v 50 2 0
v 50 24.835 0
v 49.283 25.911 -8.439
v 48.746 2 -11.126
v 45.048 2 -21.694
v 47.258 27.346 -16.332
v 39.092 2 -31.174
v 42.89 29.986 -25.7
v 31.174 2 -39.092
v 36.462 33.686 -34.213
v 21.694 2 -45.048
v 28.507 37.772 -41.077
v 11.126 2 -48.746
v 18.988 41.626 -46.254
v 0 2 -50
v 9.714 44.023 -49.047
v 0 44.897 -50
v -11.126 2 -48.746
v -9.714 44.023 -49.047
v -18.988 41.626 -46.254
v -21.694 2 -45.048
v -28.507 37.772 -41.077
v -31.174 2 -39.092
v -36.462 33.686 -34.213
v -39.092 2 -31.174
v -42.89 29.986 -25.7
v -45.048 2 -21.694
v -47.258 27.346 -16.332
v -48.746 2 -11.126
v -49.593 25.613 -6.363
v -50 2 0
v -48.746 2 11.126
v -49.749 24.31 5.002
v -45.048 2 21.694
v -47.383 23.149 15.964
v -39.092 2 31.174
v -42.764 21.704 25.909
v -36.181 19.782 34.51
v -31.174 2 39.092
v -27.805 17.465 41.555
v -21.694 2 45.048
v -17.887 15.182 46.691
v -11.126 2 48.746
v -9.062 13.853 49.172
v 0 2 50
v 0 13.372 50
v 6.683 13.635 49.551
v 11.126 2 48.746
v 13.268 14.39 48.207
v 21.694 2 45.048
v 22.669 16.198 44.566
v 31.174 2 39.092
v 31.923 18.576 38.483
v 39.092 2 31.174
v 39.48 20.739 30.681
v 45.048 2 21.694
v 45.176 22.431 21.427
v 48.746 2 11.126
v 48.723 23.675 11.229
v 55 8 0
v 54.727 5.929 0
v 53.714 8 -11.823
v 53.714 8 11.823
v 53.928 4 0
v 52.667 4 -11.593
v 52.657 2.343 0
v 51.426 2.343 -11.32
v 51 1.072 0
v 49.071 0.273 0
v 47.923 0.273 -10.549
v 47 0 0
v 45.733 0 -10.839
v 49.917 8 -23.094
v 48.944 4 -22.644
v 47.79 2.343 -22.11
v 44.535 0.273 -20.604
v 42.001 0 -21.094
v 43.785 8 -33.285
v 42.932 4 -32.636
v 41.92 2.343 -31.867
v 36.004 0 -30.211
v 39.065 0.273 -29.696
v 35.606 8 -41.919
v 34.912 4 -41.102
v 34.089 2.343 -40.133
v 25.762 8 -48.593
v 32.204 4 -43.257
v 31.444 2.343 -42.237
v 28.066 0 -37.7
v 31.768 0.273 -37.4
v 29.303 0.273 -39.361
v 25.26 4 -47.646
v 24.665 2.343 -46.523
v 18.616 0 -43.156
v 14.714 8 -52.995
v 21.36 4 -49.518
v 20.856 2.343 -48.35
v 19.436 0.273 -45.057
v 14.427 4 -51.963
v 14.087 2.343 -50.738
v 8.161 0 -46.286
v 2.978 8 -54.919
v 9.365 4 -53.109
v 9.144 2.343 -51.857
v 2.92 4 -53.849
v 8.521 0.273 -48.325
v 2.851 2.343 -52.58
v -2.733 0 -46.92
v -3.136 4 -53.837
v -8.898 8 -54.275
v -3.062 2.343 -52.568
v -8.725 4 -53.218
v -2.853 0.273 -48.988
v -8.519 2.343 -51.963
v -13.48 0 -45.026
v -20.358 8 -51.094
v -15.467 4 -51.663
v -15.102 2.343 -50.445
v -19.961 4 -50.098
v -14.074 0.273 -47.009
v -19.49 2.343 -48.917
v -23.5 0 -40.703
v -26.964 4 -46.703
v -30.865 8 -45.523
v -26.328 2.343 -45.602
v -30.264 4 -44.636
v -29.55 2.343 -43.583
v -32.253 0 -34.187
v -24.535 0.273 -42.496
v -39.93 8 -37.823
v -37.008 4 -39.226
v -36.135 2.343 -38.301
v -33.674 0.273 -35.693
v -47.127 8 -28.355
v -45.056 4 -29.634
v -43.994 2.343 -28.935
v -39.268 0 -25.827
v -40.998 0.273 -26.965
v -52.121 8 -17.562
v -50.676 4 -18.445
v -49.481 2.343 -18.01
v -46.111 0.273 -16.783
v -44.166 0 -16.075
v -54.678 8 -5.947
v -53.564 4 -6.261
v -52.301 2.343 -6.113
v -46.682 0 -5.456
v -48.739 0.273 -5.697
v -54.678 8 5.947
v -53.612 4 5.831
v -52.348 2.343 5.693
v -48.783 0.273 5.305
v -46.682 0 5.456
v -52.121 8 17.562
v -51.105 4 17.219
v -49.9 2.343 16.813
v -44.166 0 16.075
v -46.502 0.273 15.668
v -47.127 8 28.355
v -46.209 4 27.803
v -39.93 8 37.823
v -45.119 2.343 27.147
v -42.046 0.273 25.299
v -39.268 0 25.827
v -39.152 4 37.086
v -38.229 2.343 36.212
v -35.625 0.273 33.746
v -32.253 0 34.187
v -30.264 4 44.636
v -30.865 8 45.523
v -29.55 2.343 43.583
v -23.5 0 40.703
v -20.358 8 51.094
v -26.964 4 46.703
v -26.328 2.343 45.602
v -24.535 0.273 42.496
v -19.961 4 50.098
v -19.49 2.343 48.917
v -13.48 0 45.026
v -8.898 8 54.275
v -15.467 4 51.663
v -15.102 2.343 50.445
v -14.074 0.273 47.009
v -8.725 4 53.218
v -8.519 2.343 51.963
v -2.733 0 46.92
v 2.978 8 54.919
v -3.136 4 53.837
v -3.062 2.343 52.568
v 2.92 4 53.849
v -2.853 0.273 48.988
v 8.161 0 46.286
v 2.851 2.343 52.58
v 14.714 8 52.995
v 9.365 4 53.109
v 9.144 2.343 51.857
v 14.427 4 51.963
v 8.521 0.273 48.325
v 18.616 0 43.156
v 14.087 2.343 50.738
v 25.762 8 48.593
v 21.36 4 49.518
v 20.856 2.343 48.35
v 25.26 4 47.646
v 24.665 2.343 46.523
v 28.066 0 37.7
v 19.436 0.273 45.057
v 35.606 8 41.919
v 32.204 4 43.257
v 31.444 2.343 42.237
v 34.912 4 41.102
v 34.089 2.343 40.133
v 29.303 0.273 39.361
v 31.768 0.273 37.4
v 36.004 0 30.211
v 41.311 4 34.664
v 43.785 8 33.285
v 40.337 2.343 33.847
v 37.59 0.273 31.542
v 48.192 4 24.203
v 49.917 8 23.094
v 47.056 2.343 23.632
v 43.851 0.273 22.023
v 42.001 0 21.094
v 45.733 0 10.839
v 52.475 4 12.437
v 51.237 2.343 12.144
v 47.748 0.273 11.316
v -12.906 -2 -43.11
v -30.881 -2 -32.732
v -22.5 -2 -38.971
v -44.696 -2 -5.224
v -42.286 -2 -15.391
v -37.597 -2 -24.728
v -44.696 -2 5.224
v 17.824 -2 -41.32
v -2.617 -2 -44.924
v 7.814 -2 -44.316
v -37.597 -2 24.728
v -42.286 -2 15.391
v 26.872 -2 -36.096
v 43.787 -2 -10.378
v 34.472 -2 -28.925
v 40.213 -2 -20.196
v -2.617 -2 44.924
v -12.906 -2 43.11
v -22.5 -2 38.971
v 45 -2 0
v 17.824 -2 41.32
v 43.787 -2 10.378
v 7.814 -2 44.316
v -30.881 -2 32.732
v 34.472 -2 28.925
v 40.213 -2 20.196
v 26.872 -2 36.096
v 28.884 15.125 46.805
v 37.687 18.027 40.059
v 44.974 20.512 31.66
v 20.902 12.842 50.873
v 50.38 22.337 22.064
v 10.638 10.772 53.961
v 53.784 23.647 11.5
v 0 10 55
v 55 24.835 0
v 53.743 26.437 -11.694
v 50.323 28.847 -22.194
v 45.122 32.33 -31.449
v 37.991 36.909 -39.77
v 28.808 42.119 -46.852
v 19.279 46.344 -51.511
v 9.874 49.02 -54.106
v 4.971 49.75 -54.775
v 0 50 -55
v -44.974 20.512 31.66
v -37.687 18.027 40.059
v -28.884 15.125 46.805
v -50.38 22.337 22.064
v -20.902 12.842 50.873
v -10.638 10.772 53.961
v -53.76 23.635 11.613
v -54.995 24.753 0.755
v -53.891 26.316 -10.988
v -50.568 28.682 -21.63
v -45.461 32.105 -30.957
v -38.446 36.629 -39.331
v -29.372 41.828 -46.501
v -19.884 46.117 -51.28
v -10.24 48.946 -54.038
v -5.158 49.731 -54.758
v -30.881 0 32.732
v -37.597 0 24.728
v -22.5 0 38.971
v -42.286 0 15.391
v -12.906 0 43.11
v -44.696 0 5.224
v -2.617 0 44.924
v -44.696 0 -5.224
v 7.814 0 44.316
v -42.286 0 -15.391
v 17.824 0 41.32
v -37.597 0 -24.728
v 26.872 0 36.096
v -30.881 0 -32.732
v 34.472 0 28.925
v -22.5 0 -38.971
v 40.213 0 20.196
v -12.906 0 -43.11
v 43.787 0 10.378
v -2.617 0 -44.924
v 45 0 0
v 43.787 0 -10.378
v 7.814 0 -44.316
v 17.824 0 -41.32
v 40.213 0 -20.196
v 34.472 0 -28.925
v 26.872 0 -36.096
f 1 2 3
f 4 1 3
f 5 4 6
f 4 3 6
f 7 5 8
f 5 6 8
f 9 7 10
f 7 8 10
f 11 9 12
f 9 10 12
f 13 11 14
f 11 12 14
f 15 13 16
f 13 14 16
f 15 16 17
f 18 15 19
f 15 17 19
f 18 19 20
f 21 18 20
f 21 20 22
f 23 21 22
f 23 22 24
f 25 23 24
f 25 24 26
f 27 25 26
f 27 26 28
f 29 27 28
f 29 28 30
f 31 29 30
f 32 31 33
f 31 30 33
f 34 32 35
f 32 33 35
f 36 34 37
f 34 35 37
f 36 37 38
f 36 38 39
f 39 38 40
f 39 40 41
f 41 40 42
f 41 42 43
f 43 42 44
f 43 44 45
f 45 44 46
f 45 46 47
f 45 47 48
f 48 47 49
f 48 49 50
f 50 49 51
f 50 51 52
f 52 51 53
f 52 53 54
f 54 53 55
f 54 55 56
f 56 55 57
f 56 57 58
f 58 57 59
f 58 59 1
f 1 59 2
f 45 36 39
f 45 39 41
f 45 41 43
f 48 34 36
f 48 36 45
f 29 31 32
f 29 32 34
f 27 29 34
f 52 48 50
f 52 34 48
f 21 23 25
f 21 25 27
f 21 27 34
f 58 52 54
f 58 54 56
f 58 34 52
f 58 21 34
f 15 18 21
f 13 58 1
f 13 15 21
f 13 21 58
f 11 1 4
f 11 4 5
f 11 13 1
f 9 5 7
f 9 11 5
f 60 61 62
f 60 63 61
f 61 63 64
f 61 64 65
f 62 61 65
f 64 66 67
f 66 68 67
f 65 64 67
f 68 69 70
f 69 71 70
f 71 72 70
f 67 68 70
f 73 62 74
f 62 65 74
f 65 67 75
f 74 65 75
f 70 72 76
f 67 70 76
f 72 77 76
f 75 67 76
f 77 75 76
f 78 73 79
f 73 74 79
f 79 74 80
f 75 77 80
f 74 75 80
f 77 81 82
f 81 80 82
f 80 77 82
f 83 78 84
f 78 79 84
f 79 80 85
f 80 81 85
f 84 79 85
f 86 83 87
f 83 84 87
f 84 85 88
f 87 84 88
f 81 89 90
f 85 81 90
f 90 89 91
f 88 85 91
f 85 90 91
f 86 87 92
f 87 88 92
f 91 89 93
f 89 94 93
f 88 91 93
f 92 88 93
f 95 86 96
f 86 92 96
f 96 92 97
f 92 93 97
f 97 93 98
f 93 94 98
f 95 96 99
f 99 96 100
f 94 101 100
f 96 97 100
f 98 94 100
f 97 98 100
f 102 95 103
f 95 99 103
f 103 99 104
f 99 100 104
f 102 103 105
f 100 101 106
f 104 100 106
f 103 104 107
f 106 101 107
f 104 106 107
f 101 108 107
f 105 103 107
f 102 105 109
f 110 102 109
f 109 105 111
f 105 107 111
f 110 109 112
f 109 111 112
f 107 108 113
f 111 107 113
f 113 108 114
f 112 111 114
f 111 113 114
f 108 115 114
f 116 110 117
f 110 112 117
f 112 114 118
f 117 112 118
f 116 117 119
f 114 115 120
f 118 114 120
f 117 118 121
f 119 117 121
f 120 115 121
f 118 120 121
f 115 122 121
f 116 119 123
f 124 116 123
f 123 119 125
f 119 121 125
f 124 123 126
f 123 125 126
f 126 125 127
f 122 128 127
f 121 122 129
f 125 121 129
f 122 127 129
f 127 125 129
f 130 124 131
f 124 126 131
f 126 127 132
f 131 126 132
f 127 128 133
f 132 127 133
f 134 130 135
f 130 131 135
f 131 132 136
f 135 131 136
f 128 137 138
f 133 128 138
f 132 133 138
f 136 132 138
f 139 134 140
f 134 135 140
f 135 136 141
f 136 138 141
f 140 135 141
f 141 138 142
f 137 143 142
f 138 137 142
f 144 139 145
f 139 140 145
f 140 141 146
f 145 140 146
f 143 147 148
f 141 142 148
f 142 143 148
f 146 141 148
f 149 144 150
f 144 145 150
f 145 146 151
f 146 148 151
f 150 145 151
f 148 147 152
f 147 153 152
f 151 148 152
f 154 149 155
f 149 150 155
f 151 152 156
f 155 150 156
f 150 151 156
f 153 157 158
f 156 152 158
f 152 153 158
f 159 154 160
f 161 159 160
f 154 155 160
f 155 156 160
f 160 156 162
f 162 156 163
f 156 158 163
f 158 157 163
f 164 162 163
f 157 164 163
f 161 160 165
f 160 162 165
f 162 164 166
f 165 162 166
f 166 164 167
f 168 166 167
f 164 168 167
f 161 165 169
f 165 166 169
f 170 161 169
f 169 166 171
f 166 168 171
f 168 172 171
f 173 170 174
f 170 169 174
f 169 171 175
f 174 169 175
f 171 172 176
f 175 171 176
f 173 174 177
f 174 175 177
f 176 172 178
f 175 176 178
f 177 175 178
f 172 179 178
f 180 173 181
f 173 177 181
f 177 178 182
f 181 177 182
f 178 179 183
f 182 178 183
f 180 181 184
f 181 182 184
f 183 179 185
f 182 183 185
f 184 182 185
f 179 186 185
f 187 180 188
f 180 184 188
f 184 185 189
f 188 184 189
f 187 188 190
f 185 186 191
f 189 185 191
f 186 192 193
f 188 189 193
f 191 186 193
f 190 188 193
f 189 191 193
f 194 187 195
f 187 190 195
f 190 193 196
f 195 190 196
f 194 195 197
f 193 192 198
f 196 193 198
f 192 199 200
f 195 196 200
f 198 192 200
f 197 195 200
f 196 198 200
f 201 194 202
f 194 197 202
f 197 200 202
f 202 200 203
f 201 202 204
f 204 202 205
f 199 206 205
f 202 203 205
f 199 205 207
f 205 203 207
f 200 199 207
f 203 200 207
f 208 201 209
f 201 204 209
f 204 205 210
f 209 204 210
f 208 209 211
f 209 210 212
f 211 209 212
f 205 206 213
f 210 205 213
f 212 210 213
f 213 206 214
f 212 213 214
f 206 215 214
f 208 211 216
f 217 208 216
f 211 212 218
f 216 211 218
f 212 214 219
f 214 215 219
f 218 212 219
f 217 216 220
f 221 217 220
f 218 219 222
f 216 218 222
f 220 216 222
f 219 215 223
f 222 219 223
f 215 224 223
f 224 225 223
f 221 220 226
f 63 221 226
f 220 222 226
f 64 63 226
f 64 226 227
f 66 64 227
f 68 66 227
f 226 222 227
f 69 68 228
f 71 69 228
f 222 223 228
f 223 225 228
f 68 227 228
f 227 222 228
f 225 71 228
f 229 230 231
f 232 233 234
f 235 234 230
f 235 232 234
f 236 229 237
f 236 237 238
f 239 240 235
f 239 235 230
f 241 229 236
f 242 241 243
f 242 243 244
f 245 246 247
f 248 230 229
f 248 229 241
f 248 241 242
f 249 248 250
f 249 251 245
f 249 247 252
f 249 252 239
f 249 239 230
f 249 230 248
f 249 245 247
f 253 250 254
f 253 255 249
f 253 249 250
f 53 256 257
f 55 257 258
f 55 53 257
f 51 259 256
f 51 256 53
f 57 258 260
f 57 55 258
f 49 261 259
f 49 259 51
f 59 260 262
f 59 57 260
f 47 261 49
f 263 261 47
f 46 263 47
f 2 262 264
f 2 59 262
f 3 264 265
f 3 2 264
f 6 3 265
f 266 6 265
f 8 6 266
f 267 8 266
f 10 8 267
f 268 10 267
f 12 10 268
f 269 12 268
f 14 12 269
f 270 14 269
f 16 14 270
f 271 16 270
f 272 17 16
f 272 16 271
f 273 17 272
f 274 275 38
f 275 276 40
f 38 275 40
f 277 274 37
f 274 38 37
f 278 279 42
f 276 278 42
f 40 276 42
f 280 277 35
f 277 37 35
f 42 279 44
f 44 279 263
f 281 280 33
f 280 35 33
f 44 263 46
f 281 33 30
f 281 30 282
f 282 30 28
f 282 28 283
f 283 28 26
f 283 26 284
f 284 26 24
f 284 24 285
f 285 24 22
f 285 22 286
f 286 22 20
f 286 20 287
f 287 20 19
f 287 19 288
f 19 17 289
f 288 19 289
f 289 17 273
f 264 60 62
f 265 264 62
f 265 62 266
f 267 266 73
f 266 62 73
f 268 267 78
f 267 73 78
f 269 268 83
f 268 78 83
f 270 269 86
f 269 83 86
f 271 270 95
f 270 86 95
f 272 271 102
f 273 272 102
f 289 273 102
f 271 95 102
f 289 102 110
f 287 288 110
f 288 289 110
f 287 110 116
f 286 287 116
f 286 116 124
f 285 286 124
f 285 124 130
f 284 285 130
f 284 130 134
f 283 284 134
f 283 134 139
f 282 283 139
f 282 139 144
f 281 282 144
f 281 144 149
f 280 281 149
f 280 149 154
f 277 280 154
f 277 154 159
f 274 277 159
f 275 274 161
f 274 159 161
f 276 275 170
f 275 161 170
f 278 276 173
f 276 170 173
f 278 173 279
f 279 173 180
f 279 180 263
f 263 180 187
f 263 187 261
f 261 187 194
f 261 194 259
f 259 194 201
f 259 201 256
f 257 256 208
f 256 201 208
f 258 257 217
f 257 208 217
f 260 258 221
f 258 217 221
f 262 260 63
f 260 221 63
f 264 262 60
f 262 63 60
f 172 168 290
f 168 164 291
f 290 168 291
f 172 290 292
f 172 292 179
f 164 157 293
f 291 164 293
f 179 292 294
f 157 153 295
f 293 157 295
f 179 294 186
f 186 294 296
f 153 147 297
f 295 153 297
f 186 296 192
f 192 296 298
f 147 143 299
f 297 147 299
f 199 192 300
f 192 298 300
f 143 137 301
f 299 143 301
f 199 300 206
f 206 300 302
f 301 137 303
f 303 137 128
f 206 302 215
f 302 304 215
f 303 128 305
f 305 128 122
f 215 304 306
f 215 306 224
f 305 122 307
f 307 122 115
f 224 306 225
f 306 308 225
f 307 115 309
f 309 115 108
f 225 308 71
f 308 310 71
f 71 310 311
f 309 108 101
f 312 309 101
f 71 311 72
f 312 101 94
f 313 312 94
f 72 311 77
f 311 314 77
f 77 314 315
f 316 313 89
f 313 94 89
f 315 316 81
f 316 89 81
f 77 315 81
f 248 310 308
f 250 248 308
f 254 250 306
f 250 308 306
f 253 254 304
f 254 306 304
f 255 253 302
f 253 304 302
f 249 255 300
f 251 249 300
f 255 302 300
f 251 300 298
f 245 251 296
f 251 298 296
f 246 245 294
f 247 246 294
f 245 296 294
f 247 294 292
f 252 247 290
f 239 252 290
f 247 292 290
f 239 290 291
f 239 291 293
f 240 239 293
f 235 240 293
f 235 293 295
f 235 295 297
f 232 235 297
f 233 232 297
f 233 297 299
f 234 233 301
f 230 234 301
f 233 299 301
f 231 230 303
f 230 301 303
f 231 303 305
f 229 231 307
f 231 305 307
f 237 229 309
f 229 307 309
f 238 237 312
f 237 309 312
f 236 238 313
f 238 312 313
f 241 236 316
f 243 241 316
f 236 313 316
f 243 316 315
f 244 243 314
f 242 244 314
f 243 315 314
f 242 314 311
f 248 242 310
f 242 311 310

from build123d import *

# Parameters (mm, degrees)
SKETCH1_R           = 55
BOSS_EXTRUDE1_DEPTH = 50
SKETCH2_R           = 50
CUT_EXTRUDE1_DEPTH  = 48
CUT_EXTRUDE2_DEPTH  = 64
SKETCH4_R           = 45
BOSS_EXTRUDE2_DEPTH = 2
FILLET1_R           = 8


with BuildPart() as part:
    # Sketch1 → Boss-Extrude1 (new body)
    with BuildSketch(Plane(origin=(0, 0, 0), x_dir=(1, 0, 0), z_dir=(0, 1, 0))):
        Circle(SKETCH1_R)
    extrude(amount=BOSS_EXTRUDE1_DEPTH)

    # Sketch2 → Cut-Extrude1 (cut)
    with BuildSketch(Plane(origin=(0, 50, 0), x_dir=(1, 0, 0), z_dir=(0, 1, 0))):
        Circle(SKETCH2_R)
    extrude(amount=-CUT_EXTRUDE1_DEPTH, mode=Mode.SUBTRACT)

    # Sketch3 → Cut-Extrude2 (cut, symmetric)
    with BuildSketch(Plane(origin=(0, 0, 0), x_dir=(0, 0, -1), z_dir=(1, 0, 0))):
        with BuildLine():
            Line((-55, 10), (-55, 50))
            Line((-55, 50), (55, 50))
            add(Edge.make_bspline(
                [(-55, 10), (-32.185575053, 27.405291441), (13.190680472, 18.202995652), (46.289902957, 40.289555955), (55, 50)],
                knots=[0, 0, 0, 0, 0.690633178, 1, 1, 1, 1], degree=3))
        make_face()
    extrude(amount=CUT_EXTRUDE2_DEPTH, both=True, mode=Mode.SUBTRACT)

    # Sketch4 → Boss-Extrude2 (add)
    with BuildSketch(Plane.XZ):
        Circle(SKETCH4_R)
    extrude(amount=BOSS_EXTRUDE2_DEPTH)

    # Fillet1
    fillet1_edges = [part.edges().sort_by_distance(p)[0] for p in [
        (-55, 0, 0),
    ]]
    fillet(fillet1_edges, radius=FILLET1_R)


solid = part.part
